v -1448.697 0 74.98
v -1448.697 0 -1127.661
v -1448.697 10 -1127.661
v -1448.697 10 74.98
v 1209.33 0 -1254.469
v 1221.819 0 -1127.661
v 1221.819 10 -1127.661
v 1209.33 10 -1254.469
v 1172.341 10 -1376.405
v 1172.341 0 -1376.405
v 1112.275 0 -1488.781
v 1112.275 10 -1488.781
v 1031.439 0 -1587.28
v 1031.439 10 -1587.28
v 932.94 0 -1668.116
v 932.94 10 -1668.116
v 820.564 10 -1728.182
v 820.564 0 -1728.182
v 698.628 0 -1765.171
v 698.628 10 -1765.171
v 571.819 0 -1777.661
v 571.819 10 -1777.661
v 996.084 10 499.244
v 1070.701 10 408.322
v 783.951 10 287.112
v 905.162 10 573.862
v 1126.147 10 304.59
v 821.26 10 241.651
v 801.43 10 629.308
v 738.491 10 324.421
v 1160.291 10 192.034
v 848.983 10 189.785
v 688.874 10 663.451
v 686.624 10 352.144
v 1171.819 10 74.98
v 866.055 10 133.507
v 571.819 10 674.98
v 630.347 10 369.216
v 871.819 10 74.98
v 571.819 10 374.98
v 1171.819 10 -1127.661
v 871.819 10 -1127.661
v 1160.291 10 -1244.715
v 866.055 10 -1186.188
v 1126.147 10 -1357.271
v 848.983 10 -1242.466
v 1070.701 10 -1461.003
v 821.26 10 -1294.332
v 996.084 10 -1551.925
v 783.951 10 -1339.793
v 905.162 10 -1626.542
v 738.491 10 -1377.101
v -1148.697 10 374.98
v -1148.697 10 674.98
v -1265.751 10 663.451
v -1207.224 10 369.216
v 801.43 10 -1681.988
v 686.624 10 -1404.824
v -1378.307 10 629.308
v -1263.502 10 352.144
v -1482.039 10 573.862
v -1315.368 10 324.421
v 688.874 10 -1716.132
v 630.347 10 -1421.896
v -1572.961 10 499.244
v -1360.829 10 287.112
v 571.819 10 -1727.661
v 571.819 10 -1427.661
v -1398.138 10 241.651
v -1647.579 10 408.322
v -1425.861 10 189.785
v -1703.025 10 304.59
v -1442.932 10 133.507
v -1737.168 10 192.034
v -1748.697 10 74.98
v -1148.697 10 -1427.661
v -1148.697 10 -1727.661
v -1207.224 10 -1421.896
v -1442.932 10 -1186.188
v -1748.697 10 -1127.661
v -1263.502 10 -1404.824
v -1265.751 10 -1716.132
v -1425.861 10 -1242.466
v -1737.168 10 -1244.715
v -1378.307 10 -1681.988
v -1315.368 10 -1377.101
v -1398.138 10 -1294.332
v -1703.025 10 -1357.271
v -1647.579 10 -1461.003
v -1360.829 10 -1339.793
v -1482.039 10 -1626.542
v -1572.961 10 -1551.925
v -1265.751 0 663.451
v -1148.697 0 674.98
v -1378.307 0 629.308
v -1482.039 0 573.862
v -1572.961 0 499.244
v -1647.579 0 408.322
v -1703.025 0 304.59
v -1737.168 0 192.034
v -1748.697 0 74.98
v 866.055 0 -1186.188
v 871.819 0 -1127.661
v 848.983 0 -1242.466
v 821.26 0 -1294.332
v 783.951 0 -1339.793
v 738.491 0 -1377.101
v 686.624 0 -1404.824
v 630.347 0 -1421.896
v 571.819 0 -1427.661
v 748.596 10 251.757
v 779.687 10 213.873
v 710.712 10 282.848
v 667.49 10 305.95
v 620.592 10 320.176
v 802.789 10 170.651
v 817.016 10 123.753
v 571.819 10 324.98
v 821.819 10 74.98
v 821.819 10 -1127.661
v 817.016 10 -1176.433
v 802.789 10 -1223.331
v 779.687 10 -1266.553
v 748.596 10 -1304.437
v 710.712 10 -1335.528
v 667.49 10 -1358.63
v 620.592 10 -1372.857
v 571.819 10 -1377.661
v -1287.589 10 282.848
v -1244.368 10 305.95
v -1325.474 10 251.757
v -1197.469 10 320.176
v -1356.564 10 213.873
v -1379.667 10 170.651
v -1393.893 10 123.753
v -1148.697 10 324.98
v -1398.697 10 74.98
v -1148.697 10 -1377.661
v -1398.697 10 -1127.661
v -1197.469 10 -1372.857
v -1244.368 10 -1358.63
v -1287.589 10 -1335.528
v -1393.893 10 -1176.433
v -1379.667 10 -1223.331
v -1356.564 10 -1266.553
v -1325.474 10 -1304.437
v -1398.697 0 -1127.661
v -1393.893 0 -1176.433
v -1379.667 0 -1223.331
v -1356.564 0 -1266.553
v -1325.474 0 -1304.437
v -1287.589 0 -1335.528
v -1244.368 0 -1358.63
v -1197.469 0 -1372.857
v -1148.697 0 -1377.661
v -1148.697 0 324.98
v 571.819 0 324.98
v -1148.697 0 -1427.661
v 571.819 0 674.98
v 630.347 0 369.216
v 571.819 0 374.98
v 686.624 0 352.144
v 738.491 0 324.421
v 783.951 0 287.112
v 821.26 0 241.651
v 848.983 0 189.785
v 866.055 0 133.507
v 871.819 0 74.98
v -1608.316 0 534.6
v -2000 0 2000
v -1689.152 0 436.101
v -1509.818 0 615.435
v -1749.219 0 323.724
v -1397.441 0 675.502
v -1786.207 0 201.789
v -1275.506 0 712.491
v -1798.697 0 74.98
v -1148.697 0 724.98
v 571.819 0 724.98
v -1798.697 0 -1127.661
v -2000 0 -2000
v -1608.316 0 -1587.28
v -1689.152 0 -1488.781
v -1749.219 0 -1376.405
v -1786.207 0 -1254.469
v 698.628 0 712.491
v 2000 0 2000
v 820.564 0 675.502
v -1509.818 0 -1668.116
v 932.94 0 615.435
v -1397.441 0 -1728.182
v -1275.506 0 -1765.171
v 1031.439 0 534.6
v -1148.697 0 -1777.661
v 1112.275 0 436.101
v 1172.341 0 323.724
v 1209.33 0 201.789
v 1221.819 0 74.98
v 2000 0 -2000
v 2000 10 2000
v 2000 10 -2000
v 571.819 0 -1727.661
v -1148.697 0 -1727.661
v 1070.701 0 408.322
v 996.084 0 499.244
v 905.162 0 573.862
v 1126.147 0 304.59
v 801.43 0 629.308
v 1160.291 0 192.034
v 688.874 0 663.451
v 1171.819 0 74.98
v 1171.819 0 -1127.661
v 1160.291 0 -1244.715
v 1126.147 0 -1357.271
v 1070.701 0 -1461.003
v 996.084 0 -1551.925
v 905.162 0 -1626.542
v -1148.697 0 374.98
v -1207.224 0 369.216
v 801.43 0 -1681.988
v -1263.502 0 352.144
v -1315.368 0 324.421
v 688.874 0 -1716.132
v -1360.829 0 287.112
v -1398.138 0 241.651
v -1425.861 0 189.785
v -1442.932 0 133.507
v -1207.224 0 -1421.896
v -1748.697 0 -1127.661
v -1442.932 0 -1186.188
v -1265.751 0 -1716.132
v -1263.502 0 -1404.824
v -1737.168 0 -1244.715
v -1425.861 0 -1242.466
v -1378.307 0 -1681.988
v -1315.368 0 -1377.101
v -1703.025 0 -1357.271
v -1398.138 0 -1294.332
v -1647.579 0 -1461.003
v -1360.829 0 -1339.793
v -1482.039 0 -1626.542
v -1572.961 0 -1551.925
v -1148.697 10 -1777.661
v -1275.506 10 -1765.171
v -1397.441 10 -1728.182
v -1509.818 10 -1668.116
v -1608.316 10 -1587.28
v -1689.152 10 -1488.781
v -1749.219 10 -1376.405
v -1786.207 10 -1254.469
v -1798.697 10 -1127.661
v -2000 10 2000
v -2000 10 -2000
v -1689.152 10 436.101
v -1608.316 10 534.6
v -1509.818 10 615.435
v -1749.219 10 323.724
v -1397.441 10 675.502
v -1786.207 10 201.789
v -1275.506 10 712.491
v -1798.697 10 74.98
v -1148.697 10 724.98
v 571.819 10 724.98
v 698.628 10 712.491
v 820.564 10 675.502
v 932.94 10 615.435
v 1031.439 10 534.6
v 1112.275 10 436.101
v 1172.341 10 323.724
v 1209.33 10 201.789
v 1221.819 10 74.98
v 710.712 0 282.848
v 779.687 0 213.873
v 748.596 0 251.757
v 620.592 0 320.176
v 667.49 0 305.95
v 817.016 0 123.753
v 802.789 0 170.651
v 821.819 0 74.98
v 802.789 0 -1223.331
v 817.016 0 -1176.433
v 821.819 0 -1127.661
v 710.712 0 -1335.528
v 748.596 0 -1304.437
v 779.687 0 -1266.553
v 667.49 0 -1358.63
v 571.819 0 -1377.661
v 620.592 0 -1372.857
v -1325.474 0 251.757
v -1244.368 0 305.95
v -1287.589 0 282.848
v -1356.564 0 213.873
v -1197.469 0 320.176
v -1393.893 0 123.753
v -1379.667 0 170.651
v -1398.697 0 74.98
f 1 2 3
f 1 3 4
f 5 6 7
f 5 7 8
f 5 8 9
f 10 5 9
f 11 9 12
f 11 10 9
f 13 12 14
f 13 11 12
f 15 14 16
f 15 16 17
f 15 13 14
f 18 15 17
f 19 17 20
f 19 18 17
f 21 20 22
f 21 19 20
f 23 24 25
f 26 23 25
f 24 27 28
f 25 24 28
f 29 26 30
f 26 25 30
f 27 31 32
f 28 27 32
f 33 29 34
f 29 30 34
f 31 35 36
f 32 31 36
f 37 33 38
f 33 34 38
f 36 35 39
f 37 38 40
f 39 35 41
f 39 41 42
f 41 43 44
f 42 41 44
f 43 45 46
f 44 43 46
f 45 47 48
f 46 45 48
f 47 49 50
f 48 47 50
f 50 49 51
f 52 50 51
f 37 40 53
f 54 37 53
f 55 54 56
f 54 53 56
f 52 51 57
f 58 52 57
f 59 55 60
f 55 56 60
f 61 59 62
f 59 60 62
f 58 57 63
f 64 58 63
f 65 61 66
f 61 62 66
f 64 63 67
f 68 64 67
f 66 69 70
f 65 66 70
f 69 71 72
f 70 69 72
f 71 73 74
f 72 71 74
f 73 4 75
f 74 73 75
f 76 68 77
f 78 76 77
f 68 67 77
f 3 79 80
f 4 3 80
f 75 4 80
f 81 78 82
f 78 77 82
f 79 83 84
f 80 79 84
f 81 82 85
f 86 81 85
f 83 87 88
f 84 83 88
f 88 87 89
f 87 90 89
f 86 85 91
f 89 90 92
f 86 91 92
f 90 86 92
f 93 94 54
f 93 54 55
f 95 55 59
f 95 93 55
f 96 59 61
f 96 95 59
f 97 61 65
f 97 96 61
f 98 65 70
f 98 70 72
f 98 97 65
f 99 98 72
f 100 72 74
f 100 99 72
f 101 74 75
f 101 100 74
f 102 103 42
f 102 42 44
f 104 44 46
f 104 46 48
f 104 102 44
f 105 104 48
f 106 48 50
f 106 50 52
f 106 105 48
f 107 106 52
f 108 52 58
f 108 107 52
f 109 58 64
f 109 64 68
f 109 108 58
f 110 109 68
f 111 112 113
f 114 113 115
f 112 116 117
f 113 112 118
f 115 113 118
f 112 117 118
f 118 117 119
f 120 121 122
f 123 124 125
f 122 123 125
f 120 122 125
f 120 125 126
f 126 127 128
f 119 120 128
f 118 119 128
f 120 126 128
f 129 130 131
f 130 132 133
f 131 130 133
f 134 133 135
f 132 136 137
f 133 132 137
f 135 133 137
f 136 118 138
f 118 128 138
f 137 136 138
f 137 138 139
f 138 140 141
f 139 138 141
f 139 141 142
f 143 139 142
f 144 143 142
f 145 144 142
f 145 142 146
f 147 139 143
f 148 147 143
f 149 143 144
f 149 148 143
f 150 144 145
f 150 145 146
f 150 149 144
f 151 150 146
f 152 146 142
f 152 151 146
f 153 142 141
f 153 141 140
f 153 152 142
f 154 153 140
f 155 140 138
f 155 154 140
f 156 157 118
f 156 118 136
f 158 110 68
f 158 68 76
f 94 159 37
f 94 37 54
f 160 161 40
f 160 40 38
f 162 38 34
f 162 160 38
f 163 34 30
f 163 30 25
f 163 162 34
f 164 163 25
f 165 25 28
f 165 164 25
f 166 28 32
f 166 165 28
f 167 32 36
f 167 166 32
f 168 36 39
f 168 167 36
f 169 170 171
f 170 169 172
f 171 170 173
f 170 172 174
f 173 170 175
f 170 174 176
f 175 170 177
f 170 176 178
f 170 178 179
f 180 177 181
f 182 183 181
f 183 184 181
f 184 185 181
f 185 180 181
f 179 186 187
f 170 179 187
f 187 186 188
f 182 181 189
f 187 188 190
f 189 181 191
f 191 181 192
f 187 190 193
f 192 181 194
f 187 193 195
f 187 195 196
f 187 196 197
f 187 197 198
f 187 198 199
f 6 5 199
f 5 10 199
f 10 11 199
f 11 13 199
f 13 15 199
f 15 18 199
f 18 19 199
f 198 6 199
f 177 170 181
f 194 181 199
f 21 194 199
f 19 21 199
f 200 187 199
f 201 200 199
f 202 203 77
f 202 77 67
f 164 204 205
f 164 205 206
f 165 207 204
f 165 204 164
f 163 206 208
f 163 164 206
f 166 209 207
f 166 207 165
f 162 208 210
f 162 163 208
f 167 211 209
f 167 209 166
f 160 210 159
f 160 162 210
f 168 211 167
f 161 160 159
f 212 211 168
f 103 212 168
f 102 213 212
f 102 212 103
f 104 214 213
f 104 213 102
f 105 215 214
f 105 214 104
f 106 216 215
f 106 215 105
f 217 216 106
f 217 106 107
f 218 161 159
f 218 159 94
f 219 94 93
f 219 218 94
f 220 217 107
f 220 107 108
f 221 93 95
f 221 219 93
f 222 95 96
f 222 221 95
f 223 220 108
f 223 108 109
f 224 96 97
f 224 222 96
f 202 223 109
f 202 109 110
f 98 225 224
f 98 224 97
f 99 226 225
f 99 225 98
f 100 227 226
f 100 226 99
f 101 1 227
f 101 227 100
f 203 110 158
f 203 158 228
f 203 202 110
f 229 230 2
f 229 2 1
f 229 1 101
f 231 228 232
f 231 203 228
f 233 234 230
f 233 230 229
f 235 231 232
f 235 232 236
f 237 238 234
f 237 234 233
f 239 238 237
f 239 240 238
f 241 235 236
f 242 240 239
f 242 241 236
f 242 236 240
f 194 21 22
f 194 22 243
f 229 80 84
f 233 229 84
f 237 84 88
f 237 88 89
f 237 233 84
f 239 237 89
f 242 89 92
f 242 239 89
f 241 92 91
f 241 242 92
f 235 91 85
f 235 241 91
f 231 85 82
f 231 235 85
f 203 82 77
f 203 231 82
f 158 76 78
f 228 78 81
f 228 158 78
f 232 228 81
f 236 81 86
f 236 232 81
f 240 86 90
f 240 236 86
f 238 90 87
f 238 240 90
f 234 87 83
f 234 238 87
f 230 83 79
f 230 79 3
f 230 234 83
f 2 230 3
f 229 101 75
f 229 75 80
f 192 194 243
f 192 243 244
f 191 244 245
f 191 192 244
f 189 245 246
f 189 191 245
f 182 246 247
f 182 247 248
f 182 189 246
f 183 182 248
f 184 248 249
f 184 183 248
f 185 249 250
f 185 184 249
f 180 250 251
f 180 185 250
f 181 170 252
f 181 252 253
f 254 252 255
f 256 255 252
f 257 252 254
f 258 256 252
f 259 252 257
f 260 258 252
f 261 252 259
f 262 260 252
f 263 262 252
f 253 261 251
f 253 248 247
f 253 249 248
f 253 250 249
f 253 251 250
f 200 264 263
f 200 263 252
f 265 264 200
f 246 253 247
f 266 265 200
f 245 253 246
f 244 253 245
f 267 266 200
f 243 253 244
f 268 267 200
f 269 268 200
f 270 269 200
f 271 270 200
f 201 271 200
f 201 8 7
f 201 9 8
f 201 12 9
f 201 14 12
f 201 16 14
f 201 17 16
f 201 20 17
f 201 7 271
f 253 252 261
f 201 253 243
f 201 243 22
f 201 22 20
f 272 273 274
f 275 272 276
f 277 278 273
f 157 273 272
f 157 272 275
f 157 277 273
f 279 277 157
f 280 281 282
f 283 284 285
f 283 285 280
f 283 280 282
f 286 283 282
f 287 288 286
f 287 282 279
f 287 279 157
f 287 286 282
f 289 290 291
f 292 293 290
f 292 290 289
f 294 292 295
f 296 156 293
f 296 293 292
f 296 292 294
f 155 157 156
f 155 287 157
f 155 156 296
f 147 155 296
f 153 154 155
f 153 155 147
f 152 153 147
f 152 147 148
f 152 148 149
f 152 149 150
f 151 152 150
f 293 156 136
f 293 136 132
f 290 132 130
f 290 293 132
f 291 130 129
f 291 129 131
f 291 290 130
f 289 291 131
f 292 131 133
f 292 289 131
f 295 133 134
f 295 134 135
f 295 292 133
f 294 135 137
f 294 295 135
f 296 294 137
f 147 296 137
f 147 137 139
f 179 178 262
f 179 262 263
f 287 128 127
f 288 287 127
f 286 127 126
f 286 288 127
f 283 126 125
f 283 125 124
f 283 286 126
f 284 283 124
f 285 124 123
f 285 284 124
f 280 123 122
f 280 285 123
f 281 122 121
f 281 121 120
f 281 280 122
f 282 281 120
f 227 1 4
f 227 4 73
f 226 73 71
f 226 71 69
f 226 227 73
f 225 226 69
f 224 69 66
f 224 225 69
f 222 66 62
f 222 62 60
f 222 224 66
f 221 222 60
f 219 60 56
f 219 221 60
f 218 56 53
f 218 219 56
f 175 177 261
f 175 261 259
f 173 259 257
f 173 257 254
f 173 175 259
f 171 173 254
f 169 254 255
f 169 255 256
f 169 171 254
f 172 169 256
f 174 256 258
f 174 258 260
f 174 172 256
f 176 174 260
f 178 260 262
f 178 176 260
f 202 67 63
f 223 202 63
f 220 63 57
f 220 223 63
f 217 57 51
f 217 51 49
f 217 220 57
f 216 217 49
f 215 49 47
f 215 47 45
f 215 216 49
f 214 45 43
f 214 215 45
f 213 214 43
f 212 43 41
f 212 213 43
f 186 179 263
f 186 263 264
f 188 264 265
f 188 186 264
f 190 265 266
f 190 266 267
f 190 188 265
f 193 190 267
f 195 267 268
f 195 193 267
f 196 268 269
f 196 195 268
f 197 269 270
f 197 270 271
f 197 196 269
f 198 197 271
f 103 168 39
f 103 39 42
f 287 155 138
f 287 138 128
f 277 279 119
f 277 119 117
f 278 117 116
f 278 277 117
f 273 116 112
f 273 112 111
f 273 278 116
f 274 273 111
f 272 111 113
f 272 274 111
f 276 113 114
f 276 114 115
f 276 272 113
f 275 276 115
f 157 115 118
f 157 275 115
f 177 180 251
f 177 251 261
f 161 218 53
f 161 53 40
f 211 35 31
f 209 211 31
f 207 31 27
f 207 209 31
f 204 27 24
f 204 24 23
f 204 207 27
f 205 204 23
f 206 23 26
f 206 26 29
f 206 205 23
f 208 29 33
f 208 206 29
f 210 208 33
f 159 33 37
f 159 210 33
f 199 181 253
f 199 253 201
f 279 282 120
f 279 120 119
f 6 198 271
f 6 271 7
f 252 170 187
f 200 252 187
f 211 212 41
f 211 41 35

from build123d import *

# Parameters (mm, degrees)
SKETCH1_W             = 4000
SKETCH1_H             = 4000
BOSS_EXTRUDE2_DEPTH   = 10
BOSS_EXTRUDE2_2_DEPTH = 10
BOSS_EXTRUDE2_3_DEPTH = 10


with BuildPart() as part:
    # Sketch1 → Boss-Extrude2 (new body)
    with BuildSketch(Plane(origin=(0, 0, 0), x_dir=(1, 0, 0), z_dir=(0, 1, 0))):
        Rectangle(SKETCH1_W, SKETCH1_H)
        with BuildLine():
            ThreePointArc((-1798.69687513, -74.980124621), (-1608.316282902, -534.599532393), (-1148.69687513, -724.980124621))
            Line((-1148.69687513, -724.980124621), (571.819461789, -724.980124621))
            ThreePointArc((571.819461789, -724.980124621), (1031.43886956, -534.599532393), (1221.819461789, -74.980124621))
            Line((1221.819461789, -74.980124621), (1221.819461789, 1127.660592132))
            ThreePointArc((1221.819461789, 1127.660592132), (1031.43886956, 1587.279999903), (571.819461789, 1777.660592132))
            Line((571.819461789, 1777.660592132), (-1148.69687513, 1777.660592132))
            ThreePointArc((-1148.69687513, 1777.660592132), (-1608.316282902, 1587.279999903), (-1798.69687513, 1127.660592132))
            Line((-1798.69687513, 1127.660592132), (-1798.69687513, -74.980124621))
        make_face(mode=Mode.SUBTRACT)
    extrude(amount=BOSS_EXTRUDE2_DEPTH)


with BuildPart() as body_2:
    # Sketch1 → Boss-Extrude2 2 (new body)
    with BuildSketch(Plane(origin=(0, 0, 0), x_dir=(1, 0, 0), z_dir=(0, 1, 0))):
        with BuildLine():
            Line((-1148.69687513, 1727.660592132), (571.819461789, 1727.660592132))
            ThreePointArc((571.819461789, 1727.660592132), (996.083530501, 1551.924660844), (1171.819461789, 1127.660592132))
            Line((1171.819461789, 1127.660592132), (1171.819461789, -74.980124621))
            ThreePointArc((1171.819461789, -74.980124621), (996.083530501, -499.244193333), (571.819461789, -674.980124621))
            Line((571.819461789, -674.980124621), (-1148.69687513, -674.980124621))
            ThreePointArc((-1148.69687513, -674.980124621), (-1572.960943842, -499.244193333), (-1748.69687513, -74.980124621))
            Line((-1748.69687513, -74.980124621), (-1748.69687513, 1127.660592132))
            ThreePointArc((-1748.69687513, 1127.660592132), (-1572.960943842, 1551.924660844), (-1148.69687513, 1727.660592132))
        make_face()
        with BuildLine():
            ThreePointArc((-1148.69687513, 1427.660592132), (-1360.828909486, 1339.792626488), (-1448.69687513, 1127.660592132))
            Line((-1448.69687513, 1127.660592132), (-1448.69687513, -74.980124621))
            ThreePointArc((-1448.69687513, -74.980124621), (-1360.828909486, -287.112158977), (-1148.69687513, -374.980124621))
            Line((-1148.69687513, -374.980124621), (571.819461789, -374.980124621))
            ThreePointArc((571.819461789, -374.980124621), (783.951496145, -287.112158977), (871.819461789, -74.980124621))
            Line((871.819461789, -74.980124621), (871.819461789, 1127.660592132))
            ThreePointArc((871.819461789, 1127.660592132), (783.951496145, 1339.792626488), (571.819461789, 1427.660592132))
            Line((571.819461789, 1427.660592132), (-1148.69687513, 1427.660592132))
        make_face(mode=Mode.SUBTRACT)
    extrude(amount=BOSS_EXTRUDE2_2_DEPTH)


with BuildPart() as body_3:
    # Sketch1 → Boss-Extrude2 3 (new body)
    with BuildSketch(Plane(origin=(0, 0, 0), x_dir=(1, 0, 0), z_dir=(0, 1, 0))):
        with BuildLine():
            Line((-1148.69687513, 1377.660592132), (571.819461789, 1377.660592132))
            ThreePointArc((571.819461789, 1377.660592132), (748.596157085, 1304.437287428), (821.819461789, 1127.660592132))
            Line((821.819461789, 1127.660592132), (821.819461789, -74.980124621))
            ThreePointArc((821.819461789, -74.980124621), (748.596157085, -251.756819918), (571.819461789, -324.980124621))
            Line((571.819461789, -324.980124621), (-1148.69687513, -324.980124621))
            ThreePointArc((-1148.69687513, -324.980124621), (-1325.473570427, -251.756819918), (-1398.69687513, -74.980124621))
            Line((-1398.69687513, -74.980124621), (-1398.69687513, 1127.660592132))
            ThreePointArc((-1398.69687513, 1127.660592132), (-1325.473570427, 1304.437287428), (-1148.69687513, 1377.660592132))
        make_face()
    extrude(amount=BOSS_EXTRUDE2_3_DEPTH)


solid = Compound([part.part, body_2.part, body_3.part])
